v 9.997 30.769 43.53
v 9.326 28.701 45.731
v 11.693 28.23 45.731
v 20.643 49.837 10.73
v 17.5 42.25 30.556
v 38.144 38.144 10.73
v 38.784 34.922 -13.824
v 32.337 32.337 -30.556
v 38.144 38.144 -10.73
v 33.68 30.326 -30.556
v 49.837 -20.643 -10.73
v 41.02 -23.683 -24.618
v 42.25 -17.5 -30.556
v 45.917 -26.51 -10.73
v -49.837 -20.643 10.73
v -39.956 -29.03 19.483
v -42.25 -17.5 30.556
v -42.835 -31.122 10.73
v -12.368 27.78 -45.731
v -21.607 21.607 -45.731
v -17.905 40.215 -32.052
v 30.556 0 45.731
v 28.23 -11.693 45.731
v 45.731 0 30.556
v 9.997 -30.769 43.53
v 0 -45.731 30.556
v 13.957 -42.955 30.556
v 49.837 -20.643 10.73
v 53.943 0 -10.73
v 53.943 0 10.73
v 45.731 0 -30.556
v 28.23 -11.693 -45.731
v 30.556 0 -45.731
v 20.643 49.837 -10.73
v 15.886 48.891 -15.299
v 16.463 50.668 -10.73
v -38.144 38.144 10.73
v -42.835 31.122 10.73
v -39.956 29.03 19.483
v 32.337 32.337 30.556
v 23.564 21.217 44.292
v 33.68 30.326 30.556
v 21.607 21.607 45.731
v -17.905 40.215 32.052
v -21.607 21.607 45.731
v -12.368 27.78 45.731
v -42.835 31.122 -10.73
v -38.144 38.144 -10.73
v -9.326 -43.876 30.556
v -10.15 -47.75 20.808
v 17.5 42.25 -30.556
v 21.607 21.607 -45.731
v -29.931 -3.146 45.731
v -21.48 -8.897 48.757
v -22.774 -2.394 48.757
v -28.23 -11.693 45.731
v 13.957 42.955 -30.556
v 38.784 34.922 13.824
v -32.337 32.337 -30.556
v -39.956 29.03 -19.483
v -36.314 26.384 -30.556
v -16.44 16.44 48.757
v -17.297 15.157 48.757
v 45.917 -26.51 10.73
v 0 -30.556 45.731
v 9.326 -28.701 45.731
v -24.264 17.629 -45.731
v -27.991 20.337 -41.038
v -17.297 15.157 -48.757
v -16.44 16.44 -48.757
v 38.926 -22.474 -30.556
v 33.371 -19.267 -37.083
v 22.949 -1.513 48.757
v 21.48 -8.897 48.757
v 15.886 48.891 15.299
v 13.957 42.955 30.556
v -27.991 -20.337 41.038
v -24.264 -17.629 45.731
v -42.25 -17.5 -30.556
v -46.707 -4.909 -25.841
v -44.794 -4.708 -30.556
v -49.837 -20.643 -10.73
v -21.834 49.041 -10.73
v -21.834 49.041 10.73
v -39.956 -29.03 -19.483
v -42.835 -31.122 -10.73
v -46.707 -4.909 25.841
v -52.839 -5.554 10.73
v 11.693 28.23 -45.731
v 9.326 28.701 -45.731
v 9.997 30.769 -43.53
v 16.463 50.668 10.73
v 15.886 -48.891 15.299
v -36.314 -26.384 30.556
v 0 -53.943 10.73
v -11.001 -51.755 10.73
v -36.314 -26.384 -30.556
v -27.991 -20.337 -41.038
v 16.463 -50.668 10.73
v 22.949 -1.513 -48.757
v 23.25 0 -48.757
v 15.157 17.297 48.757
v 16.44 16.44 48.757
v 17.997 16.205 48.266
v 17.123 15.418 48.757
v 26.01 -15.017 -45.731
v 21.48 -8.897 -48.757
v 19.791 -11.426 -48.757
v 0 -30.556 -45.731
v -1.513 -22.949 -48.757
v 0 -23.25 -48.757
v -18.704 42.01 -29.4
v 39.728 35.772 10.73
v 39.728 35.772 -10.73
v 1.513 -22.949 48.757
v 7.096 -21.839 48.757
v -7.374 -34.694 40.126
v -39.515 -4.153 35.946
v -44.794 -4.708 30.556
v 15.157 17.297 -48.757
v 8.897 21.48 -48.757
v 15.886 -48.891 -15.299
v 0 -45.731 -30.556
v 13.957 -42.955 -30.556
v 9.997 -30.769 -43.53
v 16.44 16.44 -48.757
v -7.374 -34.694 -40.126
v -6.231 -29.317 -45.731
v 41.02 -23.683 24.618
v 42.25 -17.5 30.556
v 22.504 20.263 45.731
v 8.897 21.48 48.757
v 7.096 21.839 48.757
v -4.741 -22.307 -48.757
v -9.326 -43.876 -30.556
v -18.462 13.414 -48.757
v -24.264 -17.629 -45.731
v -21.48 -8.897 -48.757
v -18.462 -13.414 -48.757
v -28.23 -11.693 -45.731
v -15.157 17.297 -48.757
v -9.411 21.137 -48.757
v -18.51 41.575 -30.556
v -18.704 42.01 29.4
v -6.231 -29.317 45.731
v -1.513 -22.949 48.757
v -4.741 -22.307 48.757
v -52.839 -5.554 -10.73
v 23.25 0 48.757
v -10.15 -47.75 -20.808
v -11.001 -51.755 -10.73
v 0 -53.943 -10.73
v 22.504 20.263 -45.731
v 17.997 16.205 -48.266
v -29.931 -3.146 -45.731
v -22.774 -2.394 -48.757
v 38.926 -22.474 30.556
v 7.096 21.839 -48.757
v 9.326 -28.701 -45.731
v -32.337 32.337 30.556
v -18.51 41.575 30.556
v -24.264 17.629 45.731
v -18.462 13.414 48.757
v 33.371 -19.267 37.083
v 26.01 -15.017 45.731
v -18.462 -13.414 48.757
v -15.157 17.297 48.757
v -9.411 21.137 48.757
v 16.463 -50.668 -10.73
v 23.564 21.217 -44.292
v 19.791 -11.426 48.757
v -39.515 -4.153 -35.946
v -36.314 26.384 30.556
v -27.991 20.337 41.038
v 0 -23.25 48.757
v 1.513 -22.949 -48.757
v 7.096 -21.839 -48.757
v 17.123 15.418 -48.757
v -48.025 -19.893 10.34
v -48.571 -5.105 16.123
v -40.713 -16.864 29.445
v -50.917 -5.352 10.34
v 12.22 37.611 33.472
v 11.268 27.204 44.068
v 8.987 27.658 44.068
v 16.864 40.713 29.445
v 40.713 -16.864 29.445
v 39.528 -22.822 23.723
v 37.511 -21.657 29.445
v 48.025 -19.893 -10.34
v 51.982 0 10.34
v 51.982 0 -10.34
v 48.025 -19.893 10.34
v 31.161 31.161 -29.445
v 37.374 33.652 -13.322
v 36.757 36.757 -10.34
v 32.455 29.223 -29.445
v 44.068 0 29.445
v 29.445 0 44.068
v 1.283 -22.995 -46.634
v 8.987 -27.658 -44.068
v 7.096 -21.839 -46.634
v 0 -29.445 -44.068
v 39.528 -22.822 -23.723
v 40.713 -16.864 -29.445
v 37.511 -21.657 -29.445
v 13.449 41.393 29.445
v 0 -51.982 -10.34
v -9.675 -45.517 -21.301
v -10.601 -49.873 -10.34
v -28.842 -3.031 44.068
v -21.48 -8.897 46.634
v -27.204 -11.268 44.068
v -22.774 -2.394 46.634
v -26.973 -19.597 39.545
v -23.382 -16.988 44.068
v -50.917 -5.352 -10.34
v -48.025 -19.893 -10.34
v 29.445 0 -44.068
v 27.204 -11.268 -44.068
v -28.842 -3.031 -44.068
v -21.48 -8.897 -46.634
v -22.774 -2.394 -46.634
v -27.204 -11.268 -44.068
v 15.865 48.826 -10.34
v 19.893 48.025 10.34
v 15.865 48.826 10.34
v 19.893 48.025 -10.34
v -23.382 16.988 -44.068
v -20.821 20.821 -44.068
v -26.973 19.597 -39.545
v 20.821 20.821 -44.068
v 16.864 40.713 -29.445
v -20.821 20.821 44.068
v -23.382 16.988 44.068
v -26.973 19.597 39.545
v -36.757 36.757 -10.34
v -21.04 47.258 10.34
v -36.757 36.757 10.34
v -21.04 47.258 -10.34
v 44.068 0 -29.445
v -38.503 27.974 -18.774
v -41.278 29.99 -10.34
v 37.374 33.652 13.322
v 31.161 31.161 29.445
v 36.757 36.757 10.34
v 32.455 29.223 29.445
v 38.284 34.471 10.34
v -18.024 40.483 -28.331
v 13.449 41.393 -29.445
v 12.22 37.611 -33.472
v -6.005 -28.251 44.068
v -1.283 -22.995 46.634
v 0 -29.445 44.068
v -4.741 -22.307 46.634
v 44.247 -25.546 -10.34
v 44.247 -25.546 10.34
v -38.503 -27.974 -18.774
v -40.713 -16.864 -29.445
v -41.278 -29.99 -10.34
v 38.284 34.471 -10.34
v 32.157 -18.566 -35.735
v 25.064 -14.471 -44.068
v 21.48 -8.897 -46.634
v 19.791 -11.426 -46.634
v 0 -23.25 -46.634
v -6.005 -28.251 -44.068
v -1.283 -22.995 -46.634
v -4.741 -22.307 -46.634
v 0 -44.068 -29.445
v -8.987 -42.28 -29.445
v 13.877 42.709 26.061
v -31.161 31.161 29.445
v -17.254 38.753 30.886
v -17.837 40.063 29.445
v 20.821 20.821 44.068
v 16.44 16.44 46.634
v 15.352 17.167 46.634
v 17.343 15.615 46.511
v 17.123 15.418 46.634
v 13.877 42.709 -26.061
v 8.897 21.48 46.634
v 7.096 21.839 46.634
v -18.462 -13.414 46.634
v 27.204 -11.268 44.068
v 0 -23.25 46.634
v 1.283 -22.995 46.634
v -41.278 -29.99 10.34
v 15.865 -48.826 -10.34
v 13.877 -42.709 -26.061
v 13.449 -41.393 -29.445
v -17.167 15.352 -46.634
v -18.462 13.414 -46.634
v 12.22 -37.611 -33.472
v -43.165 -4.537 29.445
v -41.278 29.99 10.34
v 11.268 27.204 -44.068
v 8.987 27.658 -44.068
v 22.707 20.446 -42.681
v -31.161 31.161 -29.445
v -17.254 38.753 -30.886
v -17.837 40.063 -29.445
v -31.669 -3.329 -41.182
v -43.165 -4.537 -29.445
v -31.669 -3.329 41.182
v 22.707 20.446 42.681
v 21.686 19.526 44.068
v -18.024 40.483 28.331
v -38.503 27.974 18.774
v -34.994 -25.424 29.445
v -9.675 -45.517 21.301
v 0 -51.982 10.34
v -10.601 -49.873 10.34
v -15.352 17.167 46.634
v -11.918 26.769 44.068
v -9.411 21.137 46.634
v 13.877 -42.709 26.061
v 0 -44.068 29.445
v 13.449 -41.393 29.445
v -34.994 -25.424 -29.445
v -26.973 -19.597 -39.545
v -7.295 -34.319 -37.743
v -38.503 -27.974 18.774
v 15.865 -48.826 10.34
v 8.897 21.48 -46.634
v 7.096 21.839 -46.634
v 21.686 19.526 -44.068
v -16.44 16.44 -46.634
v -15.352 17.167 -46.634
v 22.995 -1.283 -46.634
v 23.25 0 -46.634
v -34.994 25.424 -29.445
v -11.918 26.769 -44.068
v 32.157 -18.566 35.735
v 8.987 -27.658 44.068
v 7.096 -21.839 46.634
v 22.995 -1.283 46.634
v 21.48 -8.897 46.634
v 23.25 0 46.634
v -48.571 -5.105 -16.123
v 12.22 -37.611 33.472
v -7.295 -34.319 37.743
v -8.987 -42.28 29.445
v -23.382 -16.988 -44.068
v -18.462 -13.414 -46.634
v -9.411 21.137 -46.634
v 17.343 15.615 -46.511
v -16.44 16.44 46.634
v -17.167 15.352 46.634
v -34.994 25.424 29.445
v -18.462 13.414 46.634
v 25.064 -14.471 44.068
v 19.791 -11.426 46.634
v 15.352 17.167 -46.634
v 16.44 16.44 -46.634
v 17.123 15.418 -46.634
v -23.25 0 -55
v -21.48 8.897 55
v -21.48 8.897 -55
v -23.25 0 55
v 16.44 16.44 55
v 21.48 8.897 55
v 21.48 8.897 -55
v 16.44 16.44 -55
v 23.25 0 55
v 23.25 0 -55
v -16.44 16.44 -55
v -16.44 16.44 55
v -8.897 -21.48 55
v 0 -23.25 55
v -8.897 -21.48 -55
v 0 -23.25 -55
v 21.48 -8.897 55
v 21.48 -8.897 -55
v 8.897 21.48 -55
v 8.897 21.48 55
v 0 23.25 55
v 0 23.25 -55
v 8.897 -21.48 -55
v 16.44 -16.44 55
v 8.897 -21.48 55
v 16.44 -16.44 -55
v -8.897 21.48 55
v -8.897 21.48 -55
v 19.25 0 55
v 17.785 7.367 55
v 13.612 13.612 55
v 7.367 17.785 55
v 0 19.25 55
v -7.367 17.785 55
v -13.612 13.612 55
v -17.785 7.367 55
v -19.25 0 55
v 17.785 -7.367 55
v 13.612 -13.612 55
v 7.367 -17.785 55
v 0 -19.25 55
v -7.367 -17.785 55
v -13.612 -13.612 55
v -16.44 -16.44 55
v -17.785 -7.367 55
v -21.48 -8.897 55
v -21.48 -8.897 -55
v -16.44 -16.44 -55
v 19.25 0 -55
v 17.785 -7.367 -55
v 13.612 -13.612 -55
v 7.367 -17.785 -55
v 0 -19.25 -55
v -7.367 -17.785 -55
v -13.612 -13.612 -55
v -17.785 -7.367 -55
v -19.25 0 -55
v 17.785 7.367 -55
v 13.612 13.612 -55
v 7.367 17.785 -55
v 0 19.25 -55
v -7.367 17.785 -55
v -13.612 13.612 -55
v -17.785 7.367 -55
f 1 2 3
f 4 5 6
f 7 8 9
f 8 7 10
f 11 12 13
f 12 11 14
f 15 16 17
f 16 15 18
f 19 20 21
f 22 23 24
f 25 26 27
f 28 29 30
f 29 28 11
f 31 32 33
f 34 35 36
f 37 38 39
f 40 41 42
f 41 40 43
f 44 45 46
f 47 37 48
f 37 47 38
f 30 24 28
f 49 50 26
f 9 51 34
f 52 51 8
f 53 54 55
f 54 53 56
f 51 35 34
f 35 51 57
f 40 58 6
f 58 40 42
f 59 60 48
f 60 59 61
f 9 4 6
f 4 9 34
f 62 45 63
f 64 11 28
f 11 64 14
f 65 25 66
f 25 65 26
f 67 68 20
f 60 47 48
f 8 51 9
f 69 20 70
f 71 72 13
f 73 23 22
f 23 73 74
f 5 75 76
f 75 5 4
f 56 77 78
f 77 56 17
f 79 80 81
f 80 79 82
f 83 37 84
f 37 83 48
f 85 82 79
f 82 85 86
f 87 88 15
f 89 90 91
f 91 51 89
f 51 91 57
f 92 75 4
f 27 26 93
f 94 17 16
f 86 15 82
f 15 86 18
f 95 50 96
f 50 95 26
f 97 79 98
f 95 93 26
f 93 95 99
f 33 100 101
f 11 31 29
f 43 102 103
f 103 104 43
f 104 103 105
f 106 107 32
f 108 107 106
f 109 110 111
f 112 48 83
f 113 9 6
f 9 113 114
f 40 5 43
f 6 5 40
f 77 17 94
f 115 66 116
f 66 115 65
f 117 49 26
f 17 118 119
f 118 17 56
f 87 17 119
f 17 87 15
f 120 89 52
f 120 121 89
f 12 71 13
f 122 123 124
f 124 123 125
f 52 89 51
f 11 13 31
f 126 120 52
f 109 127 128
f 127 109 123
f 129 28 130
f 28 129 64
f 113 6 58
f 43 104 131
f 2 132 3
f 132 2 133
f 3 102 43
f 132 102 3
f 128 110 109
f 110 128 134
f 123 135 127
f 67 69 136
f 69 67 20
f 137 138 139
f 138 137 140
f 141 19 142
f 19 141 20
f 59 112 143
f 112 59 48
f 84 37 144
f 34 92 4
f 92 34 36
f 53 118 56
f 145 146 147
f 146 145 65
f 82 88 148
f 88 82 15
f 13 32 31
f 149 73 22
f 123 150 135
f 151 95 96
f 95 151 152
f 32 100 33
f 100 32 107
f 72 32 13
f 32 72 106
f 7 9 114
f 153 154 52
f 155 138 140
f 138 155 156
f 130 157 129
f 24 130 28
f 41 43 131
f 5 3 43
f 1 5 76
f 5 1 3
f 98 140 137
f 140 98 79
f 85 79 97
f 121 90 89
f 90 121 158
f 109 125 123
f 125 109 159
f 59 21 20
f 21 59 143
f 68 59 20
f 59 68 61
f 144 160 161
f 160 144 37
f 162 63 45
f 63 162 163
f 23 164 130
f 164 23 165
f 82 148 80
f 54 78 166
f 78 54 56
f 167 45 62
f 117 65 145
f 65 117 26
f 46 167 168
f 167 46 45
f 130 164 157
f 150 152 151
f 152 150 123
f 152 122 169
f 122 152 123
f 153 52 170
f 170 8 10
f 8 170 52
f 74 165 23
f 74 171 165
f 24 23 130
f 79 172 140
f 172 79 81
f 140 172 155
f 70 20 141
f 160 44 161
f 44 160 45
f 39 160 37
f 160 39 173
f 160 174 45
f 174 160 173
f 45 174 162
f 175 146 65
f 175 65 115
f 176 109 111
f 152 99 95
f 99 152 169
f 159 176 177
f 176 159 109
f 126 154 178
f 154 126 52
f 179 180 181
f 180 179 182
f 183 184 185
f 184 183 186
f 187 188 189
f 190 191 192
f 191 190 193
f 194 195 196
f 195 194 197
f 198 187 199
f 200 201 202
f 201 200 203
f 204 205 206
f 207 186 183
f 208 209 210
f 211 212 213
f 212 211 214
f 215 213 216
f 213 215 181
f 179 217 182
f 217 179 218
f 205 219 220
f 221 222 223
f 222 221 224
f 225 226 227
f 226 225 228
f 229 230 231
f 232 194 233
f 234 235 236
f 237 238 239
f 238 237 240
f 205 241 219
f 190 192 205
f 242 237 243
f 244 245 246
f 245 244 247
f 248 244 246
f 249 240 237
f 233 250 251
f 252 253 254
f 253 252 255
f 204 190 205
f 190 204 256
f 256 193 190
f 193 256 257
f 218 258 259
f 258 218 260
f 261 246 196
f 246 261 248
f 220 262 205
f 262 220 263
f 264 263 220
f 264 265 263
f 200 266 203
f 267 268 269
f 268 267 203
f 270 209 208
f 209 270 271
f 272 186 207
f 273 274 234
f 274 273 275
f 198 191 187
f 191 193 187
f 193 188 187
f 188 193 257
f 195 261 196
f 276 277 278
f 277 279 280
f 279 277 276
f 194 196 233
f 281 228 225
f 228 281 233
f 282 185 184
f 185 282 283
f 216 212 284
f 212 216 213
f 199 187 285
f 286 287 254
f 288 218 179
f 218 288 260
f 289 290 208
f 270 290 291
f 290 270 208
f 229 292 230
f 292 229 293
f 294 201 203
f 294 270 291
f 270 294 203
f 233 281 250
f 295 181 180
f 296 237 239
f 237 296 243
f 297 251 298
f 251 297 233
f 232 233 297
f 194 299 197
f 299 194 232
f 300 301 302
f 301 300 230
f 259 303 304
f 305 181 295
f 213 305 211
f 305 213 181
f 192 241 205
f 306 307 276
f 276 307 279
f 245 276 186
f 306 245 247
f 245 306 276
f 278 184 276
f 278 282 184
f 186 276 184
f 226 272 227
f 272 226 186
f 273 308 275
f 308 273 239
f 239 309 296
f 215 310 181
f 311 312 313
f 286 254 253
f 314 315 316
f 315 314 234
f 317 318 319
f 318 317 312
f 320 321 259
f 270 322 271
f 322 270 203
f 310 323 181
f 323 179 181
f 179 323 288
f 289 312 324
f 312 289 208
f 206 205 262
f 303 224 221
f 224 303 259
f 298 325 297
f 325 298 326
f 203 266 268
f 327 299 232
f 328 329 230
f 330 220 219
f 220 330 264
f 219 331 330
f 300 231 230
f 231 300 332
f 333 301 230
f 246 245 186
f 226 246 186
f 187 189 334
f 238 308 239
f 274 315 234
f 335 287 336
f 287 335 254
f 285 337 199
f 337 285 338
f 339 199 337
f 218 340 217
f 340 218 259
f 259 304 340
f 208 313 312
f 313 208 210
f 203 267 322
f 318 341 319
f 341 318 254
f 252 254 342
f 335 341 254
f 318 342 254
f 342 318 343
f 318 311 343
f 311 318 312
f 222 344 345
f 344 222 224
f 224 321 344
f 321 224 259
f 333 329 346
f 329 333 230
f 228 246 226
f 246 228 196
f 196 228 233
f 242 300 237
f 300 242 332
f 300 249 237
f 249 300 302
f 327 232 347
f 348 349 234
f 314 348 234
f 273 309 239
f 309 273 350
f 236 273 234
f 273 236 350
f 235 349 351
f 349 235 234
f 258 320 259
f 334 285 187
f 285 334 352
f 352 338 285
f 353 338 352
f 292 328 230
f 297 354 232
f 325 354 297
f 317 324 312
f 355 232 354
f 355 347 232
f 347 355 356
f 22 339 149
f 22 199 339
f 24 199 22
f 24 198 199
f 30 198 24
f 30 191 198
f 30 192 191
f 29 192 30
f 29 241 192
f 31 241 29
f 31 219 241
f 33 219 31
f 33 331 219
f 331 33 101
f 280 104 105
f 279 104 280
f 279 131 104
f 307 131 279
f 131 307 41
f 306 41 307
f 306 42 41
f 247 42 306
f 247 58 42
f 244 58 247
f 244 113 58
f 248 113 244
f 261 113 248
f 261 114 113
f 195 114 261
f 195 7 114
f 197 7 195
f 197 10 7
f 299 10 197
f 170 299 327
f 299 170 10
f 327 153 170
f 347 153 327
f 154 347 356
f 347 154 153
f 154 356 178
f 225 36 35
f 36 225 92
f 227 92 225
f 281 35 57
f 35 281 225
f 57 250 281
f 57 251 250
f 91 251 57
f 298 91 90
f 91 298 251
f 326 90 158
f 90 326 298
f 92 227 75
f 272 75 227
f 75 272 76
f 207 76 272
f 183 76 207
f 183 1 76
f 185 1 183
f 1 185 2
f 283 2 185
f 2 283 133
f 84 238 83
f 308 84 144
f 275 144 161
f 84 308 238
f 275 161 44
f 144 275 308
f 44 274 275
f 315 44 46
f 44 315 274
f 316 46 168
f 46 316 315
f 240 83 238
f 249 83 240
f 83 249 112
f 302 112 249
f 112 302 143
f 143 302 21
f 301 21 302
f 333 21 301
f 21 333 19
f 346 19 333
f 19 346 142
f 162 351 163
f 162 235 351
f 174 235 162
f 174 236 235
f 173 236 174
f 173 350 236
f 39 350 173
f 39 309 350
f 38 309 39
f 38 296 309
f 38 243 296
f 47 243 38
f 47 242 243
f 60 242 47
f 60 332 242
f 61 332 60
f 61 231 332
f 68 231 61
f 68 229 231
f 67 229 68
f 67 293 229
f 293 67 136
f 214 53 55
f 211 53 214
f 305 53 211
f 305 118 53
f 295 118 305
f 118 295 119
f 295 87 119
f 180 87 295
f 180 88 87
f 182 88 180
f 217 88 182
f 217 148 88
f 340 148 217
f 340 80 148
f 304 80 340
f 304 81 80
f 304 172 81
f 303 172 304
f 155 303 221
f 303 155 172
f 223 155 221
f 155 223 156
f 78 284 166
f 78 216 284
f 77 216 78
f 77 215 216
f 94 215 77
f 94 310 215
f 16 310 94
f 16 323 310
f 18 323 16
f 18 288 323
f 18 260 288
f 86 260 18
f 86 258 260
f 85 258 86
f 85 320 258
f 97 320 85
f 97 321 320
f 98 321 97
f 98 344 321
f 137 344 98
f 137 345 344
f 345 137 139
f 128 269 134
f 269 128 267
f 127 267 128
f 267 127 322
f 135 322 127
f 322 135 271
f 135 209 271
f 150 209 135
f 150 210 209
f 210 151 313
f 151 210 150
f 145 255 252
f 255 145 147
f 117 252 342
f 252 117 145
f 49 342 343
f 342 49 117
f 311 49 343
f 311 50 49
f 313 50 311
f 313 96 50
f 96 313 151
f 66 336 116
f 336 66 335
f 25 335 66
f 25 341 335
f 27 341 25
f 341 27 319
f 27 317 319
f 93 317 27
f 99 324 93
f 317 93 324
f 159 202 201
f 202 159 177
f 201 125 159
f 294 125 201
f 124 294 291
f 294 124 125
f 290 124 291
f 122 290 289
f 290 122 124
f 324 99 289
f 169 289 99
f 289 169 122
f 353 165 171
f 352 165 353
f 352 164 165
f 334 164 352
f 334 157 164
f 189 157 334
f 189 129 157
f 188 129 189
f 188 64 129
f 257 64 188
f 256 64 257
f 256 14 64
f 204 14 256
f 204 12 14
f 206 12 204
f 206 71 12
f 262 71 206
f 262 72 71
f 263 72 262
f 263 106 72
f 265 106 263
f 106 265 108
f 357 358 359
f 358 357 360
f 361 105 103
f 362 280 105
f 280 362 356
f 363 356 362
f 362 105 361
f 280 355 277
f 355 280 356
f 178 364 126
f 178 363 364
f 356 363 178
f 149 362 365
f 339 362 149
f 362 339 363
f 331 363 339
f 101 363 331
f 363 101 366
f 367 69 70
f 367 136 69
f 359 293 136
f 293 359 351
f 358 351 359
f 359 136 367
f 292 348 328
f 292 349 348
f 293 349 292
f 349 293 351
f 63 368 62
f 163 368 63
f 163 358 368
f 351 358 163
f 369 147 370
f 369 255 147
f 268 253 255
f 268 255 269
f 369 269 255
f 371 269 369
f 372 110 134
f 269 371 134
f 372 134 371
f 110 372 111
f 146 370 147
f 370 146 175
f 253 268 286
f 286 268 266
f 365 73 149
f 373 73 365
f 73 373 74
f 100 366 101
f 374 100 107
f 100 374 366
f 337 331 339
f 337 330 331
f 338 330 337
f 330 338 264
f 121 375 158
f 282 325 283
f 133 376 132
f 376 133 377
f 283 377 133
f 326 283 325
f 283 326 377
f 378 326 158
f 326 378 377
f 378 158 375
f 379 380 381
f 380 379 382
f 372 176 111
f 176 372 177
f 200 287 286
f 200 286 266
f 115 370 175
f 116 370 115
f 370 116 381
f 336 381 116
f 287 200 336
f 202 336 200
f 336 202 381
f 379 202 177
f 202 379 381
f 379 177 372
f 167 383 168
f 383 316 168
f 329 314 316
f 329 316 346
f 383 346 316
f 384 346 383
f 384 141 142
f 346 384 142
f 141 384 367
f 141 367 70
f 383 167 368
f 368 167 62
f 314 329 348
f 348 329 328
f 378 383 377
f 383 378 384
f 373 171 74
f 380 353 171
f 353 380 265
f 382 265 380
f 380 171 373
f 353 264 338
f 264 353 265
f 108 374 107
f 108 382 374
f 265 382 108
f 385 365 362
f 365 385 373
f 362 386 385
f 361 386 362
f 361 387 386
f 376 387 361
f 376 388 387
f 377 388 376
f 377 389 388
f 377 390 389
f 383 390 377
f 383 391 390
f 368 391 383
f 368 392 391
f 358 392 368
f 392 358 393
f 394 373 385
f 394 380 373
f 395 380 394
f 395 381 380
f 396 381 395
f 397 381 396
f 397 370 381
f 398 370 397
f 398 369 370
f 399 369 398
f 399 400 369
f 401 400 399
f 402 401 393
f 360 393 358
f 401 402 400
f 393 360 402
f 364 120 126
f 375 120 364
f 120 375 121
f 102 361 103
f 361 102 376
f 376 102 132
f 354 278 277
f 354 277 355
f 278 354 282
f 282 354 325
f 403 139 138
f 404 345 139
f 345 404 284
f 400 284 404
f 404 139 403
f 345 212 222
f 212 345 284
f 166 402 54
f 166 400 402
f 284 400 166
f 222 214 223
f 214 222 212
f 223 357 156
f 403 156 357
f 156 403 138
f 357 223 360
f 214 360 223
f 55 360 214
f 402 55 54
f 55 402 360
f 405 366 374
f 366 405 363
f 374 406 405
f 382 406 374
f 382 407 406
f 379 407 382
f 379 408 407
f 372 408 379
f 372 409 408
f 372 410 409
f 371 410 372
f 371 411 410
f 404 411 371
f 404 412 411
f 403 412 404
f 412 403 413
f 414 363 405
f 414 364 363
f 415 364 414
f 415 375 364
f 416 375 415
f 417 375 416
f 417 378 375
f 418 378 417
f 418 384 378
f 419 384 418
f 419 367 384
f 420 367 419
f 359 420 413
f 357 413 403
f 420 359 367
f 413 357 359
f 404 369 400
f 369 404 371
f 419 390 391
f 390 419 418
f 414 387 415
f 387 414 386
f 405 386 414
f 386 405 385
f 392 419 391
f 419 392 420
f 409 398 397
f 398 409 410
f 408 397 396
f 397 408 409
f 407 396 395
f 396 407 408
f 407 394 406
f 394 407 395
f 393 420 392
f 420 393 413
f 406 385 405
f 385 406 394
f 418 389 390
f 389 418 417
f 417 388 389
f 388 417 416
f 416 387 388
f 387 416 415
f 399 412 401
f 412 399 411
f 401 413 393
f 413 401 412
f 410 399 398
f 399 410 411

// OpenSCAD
/*[Center]*/
// Outer diameter 
diameter = 110;

// Thickness of bow
bow_thickness=4;

// Each bows width
bow_width=15;

// Number of bows
number_bows=5;

// Innerdiameter
Innerdiameter=38.5; 
// Thickness of inner shell
thickness_inner= 8; // [1:40]

// Extra lenght inner shell
extra_length = 0; // [0:40]

height = diameter + extra_length;

//Roundness. High number give rounder circles. Use a lower value if you get timeout.
fn=16; // [1:40]
$fn = fn;
center();
module center() {
difference(){
    union() {
        difference(){
            difference(){
                sphere(r=diameter/2, center=true);
                sphere(r=diameter/2-bow_thickness/2, center=true);
            }
            sectors();
        }
        cylinder(r=Innerdiameter/2+thickness_inner/2, h=height, center=true);
        }
        cylinder(r=Innerdiameter/2, h=height, center=true); 
}
}

module sectors() {
    union(){
        steg=(360-number_bows*bow_width)/number_bows;
        for(angle = [0 : steg+bow_width : 360]) {
            translate([0,0,-height/2]) sector(height, diameter, angle, angle+steg-bow_width);
        }
    }
}


module sector(h, d, a1, a2) {
    if (a2 - a1 > 180) {
        difference() {
            cylinder(h=h, d=d);
            translate([0,0,-0.5]) sector(h+1, d+1, a2-360, a1); 
        }
    } else {
        difference() {
            cylinder(h=h, d=d);
            rotate([0,0,a1]) translate([-d/2, -d/2, -0.5])
                cube([d, d/2, h+1]);
            rotate([0,0,a2]) translate([-d/2, 0, -0.5])
                cube([d, d/2, h+1]);
        }
    }
} 
